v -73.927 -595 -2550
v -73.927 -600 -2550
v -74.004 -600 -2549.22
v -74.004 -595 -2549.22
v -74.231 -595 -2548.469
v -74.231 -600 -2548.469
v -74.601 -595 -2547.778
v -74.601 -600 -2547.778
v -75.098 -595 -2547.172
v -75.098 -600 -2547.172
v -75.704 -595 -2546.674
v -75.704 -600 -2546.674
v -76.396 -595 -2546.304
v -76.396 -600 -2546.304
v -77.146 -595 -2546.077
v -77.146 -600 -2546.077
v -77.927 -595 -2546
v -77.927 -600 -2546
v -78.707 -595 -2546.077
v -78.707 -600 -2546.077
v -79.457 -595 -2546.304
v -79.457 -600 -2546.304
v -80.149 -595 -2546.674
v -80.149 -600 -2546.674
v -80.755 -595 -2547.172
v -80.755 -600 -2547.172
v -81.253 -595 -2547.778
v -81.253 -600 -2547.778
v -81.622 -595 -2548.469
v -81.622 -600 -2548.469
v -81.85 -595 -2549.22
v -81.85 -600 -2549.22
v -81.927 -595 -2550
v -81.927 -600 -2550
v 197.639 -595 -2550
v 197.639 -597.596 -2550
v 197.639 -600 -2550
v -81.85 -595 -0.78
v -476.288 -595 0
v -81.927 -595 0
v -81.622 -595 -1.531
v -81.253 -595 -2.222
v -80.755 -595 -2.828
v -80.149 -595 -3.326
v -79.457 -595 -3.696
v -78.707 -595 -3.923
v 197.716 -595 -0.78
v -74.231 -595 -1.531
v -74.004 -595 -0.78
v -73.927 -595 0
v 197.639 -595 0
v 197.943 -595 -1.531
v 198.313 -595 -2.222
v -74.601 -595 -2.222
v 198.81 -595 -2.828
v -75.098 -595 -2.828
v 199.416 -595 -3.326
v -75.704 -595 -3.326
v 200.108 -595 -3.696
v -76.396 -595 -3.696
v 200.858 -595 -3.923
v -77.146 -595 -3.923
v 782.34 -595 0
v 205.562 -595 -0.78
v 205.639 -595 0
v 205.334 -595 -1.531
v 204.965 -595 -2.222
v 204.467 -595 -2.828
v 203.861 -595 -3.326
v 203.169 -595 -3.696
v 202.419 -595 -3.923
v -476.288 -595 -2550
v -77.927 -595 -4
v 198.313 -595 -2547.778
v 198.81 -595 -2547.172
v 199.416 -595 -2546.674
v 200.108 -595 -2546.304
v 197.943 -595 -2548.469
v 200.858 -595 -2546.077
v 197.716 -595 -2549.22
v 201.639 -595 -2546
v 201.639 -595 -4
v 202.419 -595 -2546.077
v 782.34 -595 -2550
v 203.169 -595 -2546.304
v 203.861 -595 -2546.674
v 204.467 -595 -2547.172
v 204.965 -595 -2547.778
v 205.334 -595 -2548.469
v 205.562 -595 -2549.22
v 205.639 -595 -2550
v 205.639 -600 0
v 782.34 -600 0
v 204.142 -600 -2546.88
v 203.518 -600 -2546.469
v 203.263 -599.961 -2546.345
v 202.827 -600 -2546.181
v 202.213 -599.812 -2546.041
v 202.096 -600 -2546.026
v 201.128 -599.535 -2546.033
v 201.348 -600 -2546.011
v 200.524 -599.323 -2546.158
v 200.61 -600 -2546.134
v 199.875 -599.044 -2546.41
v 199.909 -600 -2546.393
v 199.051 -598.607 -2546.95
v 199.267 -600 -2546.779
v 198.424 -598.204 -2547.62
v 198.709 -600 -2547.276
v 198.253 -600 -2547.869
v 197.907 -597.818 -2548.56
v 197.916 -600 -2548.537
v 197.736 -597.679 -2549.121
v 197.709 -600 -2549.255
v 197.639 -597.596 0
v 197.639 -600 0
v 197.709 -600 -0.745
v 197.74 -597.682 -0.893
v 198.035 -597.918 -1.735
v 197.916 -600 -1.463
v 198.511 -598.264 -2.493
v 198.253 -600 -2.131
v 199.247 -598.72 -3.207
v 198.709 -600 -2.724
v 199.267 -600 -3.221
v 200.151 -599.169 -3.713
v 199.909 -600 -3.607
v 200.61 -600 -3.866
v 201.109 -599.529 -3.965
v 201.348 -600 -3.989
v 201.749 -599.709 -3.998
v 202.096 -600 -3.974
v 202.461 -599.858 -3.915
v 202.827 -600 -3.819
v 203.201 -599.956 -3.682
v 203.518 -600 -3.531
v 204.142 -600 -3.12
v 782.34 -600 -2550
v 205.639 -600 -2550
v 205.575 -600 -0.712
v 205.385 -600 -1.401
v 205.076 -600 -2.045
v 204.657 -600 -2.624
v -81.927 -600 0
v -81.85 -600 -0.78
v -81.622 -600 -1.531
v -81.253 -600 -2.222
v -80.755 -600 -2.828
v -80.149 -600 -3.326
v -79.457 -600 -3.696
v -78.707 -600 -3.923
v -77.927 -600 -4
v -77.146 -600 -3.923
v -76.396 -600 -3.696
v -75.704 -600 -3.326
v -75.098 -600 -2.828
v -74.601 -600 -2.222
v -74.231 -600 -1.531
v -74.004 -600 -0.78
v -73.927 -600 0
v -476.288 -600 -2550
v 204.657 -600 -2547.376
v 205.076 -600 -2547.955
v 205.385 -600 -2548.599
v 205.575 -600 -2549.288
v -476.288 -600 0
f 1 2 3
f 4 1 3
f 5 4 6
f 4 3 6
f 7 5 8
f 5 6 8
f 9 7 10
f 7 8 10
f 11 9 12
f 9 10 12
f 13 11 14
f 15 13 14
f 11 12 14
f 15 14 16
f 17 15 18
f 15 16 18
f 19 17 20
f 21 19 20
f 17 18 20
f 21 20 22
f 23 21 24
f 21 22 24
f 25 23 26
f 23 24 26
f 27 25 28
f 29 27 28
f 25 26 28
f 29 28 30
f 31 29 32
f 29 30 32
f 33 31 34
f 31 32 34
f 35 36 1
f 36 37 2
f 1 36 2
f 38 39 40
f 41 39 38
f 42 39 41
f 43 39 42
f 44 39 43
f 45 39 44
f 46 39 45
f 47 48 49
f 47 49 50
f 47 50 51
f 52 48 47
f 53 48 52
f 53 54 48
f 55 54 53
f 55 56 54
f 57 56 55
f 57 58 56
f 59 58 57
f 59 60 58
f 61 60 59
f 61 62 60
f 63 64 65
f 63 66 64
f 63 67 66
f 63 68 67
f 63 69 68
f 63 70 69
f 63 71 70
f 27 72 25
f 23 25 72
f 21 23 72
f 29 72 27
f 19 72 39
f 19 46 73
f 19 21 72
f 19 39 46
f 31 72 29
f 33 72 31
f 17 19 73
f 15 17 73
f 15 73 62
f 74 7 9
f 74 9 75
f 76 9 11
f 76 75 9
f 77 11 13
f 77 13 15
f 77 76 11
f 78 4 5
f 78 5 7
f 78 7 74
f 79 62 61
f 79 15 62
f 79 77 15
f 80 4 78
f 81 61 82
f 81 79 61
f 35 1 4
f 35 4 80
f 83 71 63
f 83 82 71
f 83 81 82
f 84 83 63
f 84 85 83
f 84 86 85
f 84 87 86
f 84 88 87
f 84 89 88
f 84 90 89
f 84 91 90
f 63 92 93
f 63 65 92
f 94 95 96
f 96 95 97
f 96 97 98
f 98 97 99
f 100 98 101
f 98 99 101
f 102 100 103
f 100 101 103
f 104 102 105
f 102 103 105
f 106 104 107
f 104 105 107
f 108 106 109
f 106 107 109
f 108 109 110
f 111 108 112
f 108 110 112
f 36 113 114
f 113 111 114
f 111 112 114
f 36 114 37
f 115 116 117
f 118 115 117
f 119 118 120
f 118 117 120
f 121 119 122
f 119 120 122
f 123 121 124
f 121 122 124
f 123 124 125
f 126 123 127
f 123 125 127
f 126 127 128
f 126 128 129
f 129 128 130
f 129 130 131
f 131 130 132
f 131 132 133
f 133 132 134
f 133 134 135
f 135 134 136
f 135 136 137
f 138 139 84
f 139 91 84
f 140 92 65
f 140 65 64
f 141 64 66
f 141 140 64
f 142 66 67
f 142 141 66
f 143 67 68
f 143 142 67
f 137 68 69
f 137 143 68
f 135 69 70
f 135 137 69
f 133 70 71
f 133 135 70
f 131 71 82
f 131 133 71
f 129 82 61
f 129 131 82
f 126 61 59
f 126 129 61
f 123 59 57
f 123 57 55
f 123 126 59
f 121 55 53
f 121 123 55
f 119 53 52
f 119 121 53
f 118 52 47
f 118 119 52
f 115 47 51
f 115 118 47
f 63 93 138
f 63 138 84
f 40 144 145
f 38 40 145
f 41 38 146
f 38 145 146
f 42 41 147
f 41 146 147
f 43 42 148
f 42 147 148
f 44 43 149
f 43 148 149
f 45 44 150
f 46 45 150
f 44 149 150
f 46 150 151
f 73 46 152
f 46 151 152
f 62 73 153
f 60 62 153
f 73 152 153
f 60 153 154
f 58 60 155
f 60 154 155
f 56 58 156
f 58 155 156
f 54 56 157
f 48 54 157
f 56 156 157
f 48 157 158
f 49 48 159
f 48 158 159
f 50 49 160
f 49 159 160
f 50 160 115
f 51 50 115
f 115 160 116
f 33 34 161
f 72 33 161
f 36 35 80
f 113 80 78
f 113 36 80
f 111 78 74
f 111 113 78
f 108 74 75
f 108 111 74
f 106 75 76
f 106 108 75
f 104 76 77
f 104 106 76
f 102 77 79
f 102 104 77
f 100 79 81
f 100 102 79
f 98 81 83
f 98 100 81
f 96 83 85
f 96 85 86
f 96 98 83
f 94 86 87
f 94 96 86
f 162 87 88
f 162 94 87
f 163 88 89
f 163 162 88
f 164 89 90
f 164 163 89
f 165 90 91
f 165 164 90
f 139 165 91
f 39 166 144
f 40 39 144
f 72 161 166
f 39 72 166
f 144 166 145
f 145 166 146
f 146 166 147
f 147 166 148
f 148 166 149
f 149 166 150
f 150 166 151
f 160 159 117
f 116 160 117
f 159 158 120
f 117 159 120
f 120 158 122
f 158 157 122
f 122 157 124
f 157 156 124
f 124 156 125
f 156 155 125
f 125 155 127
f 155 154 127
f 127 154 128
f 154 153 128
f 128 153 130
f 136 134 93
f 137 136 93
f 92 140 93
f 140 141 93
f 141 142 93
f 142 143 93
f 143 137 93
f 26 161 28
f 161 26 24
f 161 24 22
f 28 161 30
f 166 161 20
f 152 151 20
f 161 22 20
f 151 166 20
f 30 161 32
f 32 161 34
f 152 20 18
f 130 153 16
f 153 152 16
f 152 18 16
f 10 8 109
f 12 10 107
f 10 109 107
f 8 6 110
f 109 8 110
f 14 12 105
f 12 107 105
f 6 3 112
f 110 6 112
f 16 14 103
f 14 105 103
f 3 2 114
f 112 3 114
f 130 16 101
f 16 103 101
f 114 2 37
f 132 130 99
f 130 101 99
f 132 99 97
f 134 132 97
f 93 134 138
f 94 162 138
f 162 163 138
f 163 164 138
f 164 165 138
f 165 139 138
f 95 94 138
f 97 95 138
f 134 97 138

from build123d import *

# Parameters (mm, degrees)
TABAN_FLAN_1_DEPTH        = 2550
KES_EKSTR_ZYON1_OUTLINE_W = 207
KES_EKSTR_ZYON1_OUTLINE_H = 2550
KES_EKSTR_ZYON1_DEPTH     = 595
KES_EKSTR_ZYON1_START     = -5
KES_EKSTR_ZYON1_2_DEPTH   = 5
KES_EKSTR_ZYON1_3_DEPTH   = 5


# Read off the part's stored shape, not the designer's step: Kes-Ekstrüzyon1
# Sheet-metal steps are written as plain solids
with BuildPart() as part:
    # Çizim1 → Taban-Flanş1 (new body)
    with BuildSketch(Plane.XY):
        with BuildLine():
            Line((0, 0), (0, -395.857864376))
            ThreePointArc((0, -395.857864376), (0.761204675, -399.6846987), (2.928932188, -402.928932188))
            Line((2.928932188, -402.928932188), (197.071067812, -597.071067812))
            ThreePointArc((197.071067812, -597.071067812), (200.3153013, -599.238795325), (204.142135624, -600))
            Line((204.142135624, -600), (782.34, -600))
            Line((782.34, -600), (782.34, -595))
            Line((782.34, -595), (204.142135624, -595))
            ThreePointArc((204.142135624, -595), (202.228718462, -594.619397663), (200.606601718, -593.535533906))
            Line((200.606601718, -593.535533906), (6.464466094, -399.393398282))
            ThreePointArc((6.464466094, -399.393398282), (5.380602337, -397.771281538), (5, -395.857864376))
            Line((5, -395.857864376), (5, 0))
            Line((5, 0), (0, 0))
        make_face()
    extrude(amount=-TABAN_FLAN_1_DEPTH)

    # Kes-Ekstrüzyon1 outline → Kes-Ekstrüzyon1 (cut)
    with BuildSketch(Plane(origin=(0, -595, 0), x_dir=(1, 0, 0), z_dir=(0, 1, 0))):
        with Locations((103.5, 1275)):
            Rectangle(KES_EKSTR_ZYON1_OUTLINE_W, KES_EKSTR_ZYON1_OUTLINE_H)
    extrude(amount=KES_EKSTR_ZYON1_DEPTH, mode=Mode.SUBTRACT)

    # Kes-Ekstr_zyon1 2 outline → Kes-Ekstr_zyon1 2 (cut)
    with BuildSketch(Plane(origin=(0, -595, 0), x_dir=(1, 0, 0), z_dir=(0, 1, 0)).offset(KES_EKSTR_ZYON1_START)):
        with BuildLine():
            ThreePointArc((197.638678978, 2550), (201.638678978, 2546), (205.638678978, 2550))
            Line((205.638678978, 2550), (197.638678978, 2550))
        make_face()
        with BuildLine():
            Line((197.638678978, 0), (205.638678978, 0))
            ThreePointArc((205.638678978, 0), (201.638678978, 4), (197.638678978, 0))
        make_face()
    extrude(amount=KES_EKSTR_ZYON1_2_DEPTH, mode=Mode.SUBTRACT)

    # Kes-Ekstr_zyon1 3 outline → Kes-Ekstr_zyon1 3 (add)
    with BuildSketch(Plane(origin=(0, -595, 0), x_dir=(1, 0, 0), z_dir=(0, 1, 0)).offset(KES_EKSTR_ZYON1_START)):
        with BuildLine():
            ThreePointArc((-73.926675541, 2550), (-77.926675541, 2546), (-81.926675541, 2550))
            Line((-81.926675541, 2550), (-476.287996563, 2550))
            Line((-476.287996563, 2550), (-476.287996563, 0))
            Line((-476.287996563, 0), (-81.926675541, 0))
            ThreePointArc((-81.926675541, 0), (-77.926675541, 4), (-73.926675541, 0))
            Line((-73.926675541, 0), (197.638678978, 0))
            ThreePointArc((197.638678978, 0), (201.638678978, 4), (205.638678978, 0))
            Line((205.638678978, 0), (207, 0))
            Line((207, 0), (207, 2550))
            Line((207, 2550), (205.638678978, 2550))
            ThreePointArc((205.638678978, 2550), (201.638678978, 2546), (197.638678978, 2550))
            Line((197.638678978, 2550), (-73.926675541, 2550))
        make_face()
    extrude(amount=KES_EKSTR_ZYON1_3_DEPTH)


solid = part.part
